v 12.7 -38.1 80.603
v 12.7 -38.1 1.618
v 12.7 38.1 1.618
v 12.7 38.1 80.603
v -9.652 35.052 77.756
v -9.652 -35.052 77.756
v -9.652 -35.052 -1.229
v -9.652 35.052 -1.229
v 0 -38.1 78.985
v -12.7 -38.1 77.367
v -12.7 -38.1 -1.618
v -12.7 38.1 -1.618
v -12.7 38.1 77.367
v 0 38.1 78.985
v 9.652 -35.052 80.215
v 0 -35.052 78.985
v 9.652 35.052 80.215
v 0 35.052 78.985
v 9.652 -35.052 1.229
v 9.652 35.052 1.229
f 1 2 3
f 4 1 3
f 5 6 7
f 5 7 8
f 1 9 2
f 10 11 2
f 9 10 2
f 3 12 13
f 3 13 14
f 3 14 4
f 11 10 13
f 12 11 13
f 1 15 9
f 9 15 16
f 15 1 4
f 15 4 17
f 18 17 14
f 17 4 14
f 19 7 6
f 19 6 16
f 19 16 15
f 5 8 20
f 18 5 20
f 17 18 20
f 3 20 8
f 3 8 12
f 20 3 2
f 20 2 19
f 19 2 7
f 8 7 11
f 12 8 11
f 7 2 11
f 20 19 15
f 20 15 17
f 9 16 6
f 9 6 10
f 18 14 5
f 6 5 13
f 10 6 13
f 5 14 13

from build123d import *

# Parameters (mm, degrees)
SKETCH2_W               = 9.652
SKETCH2_H               = 3.048
SKETCH2_W_2             = 3.048
SKETCH2_H_2             = 35.052
BOSS_EXTRUDE1_DEPTH     = 78.985121
SKETCH5_W               = 25.4
SKETCH5_H               = 76.2
SKETCH5_W_2             = 19.304
SKETCH5_H_2             = 70.104
BOSS_EXTRUDE3_DEPTH     = 50
CUT_EXTRUDE1_DEPTH      = 1
CUT_EXTRUDE1_DEPTH_BACK = 77.2
SKETCH7_W               = 25.4
SKETCH7_H               = 76.2
SKETCH7_W_2             = 19.304
SKETCH7_H_2             = 70.104
BOSS_EXTRUDE4_DEPTH     = 50
CUT_EXTRUDE2_DEPTH      = 1
CUT_EXTRUDE2_DEPTH_BACK = 77.2


with BuildPart() as part:
    # Sketch2 → Boss-Extrude1 (new body)
    with BuildSketch(Plane.XY):
        Polygon((-12.7, 0), (-9.652, 0), (-9.652, 35.052), (-9.652, 38.1), (-12.7, 38.1), align=None)
        with Locations((-4.826, 36.576)):
            Rectangle(SKETCH2_W, SKETCH2_H)
        Polygon((0, 38.1), (0, 35.052), (9.652, 35.052), (9.652, 0), (12.7, 0), (12.7, 38.1), align=None)
        with Locations((11.176, -17.526)):
            Rectangle(SKETCH2_W_2, SKETCH2_H_2)
        Polygon((-9.652, -35.052), (-9.652, 0), (-12.7, 0), (-12.7, -38.1), (0, -38.1), (0, -35.052), align=None)
        Polygon((9.652, -35.052), (0, -35.052), (0, -38.1), (12.7, -38.1), (12.7, -35.052), align=None)
    extrude(amount=BOSS_EXTRUDE1_DEPTH)

    # Sketch5 → Boss-Extrude3 (add)
    with BuildSketch(Plane(origin=(0, 0, 0), x_dir=(-1, 0, 0), z_dir=(0, 0, -1))):
        Rectangle(SKETCH5_W, SKETCH5_H)
        Rectangle(SKETCH5_W_2, SKETCH5_H_2, mode=Mode.SUBTRACT)
    extrude(amount=BOSS_EXTRUDE3_DEPTH)

    # Sketch6 → Cut-Extrude1 (cut, two sides)
    with BuildSketch(Plane.XZ.offset(38.1)) as cut_extrude1_sk:
        Polygon((-12.7, -1.617644511), (-45.228253893, -5.760884774), (-37.756637, -64.41996217), (45.640291612, -53.797396519), (38.168674718, 4.861680877), (12.7, -48.058587426), (12.7, -50), (-12.7, -50), align=None)
        Polygon((0, 0), (-12.7, -1.617644511), (-12.7, -50), (12.7, -50), (12.7, -48.058587426), (12.534006261, -48.403498707), align=None)
        Polygon((38.168674718, 4.861680877), (12.7, 1.617644511), (12.7, -48.058587426), align=None)
        Polygon((12.7, 1.617644511), (0, 0), (12.534006261, -48.403498707), (12.7, -48.058587426), align=None)
    extrude(amount=CUT_EXTRUDE1_DEPTH, mode=Mode.SUBTRACT)
    extrude(cut_extrude1_sk.sketch, amount=-CUT_EXTRUDE1_DEPTH_BACK, mode=Mode.SUBTRACT)

    # Sketch7 → Boss-Extrude4 (add)
    with BuildSketch(Plane.XY.offset(78.985120912)):
        Rectangle(SKETCH7_W, SKETCH7_H)
        Rectangle(SKETCH7_W_2, SKETCH7_H_2, mode=Mode.SUBTRACT)
    extrude(amount=BOSS_EXTRUDE4_DEPTH)

    # Sketch8 → Cut-Extrude2 (cut, two sides)
    with BuildSketch(Plane(origin=(0, 38.1, 0), x_dir=(1, 0, 0), z_dir=(0, 1, 0))) as cut_extrude2_sk:
        Polygon((-12.534006261, -127.388619619), (-12.7, -126.667826545), (-12.7, -128.985120912), (12.7, -128.985120912), (12.7, -80.602765422), (0, -78.985120912), align=None)
        Polygon((-12.7, -77.367476401), (-24.396635689, -75.877633998), (-12.7, -126.667826545), align=None)
        Polygon((0, -78.985120912), (-12.7, -77.367476401), (-12.7, -126.667826545), (-12.534006261, -127.388619619), align=None)
    extrude(amount=CUT_EXTRUDE2_DEPTH, mode=Mode.SUBTRACT)
    extrude(cut_extrude2_sk.sketch, amount=-CUT_EXTRUDE2_DEPTH_BACK, mode=Mode.SUBTRACT)


solid = part.part
